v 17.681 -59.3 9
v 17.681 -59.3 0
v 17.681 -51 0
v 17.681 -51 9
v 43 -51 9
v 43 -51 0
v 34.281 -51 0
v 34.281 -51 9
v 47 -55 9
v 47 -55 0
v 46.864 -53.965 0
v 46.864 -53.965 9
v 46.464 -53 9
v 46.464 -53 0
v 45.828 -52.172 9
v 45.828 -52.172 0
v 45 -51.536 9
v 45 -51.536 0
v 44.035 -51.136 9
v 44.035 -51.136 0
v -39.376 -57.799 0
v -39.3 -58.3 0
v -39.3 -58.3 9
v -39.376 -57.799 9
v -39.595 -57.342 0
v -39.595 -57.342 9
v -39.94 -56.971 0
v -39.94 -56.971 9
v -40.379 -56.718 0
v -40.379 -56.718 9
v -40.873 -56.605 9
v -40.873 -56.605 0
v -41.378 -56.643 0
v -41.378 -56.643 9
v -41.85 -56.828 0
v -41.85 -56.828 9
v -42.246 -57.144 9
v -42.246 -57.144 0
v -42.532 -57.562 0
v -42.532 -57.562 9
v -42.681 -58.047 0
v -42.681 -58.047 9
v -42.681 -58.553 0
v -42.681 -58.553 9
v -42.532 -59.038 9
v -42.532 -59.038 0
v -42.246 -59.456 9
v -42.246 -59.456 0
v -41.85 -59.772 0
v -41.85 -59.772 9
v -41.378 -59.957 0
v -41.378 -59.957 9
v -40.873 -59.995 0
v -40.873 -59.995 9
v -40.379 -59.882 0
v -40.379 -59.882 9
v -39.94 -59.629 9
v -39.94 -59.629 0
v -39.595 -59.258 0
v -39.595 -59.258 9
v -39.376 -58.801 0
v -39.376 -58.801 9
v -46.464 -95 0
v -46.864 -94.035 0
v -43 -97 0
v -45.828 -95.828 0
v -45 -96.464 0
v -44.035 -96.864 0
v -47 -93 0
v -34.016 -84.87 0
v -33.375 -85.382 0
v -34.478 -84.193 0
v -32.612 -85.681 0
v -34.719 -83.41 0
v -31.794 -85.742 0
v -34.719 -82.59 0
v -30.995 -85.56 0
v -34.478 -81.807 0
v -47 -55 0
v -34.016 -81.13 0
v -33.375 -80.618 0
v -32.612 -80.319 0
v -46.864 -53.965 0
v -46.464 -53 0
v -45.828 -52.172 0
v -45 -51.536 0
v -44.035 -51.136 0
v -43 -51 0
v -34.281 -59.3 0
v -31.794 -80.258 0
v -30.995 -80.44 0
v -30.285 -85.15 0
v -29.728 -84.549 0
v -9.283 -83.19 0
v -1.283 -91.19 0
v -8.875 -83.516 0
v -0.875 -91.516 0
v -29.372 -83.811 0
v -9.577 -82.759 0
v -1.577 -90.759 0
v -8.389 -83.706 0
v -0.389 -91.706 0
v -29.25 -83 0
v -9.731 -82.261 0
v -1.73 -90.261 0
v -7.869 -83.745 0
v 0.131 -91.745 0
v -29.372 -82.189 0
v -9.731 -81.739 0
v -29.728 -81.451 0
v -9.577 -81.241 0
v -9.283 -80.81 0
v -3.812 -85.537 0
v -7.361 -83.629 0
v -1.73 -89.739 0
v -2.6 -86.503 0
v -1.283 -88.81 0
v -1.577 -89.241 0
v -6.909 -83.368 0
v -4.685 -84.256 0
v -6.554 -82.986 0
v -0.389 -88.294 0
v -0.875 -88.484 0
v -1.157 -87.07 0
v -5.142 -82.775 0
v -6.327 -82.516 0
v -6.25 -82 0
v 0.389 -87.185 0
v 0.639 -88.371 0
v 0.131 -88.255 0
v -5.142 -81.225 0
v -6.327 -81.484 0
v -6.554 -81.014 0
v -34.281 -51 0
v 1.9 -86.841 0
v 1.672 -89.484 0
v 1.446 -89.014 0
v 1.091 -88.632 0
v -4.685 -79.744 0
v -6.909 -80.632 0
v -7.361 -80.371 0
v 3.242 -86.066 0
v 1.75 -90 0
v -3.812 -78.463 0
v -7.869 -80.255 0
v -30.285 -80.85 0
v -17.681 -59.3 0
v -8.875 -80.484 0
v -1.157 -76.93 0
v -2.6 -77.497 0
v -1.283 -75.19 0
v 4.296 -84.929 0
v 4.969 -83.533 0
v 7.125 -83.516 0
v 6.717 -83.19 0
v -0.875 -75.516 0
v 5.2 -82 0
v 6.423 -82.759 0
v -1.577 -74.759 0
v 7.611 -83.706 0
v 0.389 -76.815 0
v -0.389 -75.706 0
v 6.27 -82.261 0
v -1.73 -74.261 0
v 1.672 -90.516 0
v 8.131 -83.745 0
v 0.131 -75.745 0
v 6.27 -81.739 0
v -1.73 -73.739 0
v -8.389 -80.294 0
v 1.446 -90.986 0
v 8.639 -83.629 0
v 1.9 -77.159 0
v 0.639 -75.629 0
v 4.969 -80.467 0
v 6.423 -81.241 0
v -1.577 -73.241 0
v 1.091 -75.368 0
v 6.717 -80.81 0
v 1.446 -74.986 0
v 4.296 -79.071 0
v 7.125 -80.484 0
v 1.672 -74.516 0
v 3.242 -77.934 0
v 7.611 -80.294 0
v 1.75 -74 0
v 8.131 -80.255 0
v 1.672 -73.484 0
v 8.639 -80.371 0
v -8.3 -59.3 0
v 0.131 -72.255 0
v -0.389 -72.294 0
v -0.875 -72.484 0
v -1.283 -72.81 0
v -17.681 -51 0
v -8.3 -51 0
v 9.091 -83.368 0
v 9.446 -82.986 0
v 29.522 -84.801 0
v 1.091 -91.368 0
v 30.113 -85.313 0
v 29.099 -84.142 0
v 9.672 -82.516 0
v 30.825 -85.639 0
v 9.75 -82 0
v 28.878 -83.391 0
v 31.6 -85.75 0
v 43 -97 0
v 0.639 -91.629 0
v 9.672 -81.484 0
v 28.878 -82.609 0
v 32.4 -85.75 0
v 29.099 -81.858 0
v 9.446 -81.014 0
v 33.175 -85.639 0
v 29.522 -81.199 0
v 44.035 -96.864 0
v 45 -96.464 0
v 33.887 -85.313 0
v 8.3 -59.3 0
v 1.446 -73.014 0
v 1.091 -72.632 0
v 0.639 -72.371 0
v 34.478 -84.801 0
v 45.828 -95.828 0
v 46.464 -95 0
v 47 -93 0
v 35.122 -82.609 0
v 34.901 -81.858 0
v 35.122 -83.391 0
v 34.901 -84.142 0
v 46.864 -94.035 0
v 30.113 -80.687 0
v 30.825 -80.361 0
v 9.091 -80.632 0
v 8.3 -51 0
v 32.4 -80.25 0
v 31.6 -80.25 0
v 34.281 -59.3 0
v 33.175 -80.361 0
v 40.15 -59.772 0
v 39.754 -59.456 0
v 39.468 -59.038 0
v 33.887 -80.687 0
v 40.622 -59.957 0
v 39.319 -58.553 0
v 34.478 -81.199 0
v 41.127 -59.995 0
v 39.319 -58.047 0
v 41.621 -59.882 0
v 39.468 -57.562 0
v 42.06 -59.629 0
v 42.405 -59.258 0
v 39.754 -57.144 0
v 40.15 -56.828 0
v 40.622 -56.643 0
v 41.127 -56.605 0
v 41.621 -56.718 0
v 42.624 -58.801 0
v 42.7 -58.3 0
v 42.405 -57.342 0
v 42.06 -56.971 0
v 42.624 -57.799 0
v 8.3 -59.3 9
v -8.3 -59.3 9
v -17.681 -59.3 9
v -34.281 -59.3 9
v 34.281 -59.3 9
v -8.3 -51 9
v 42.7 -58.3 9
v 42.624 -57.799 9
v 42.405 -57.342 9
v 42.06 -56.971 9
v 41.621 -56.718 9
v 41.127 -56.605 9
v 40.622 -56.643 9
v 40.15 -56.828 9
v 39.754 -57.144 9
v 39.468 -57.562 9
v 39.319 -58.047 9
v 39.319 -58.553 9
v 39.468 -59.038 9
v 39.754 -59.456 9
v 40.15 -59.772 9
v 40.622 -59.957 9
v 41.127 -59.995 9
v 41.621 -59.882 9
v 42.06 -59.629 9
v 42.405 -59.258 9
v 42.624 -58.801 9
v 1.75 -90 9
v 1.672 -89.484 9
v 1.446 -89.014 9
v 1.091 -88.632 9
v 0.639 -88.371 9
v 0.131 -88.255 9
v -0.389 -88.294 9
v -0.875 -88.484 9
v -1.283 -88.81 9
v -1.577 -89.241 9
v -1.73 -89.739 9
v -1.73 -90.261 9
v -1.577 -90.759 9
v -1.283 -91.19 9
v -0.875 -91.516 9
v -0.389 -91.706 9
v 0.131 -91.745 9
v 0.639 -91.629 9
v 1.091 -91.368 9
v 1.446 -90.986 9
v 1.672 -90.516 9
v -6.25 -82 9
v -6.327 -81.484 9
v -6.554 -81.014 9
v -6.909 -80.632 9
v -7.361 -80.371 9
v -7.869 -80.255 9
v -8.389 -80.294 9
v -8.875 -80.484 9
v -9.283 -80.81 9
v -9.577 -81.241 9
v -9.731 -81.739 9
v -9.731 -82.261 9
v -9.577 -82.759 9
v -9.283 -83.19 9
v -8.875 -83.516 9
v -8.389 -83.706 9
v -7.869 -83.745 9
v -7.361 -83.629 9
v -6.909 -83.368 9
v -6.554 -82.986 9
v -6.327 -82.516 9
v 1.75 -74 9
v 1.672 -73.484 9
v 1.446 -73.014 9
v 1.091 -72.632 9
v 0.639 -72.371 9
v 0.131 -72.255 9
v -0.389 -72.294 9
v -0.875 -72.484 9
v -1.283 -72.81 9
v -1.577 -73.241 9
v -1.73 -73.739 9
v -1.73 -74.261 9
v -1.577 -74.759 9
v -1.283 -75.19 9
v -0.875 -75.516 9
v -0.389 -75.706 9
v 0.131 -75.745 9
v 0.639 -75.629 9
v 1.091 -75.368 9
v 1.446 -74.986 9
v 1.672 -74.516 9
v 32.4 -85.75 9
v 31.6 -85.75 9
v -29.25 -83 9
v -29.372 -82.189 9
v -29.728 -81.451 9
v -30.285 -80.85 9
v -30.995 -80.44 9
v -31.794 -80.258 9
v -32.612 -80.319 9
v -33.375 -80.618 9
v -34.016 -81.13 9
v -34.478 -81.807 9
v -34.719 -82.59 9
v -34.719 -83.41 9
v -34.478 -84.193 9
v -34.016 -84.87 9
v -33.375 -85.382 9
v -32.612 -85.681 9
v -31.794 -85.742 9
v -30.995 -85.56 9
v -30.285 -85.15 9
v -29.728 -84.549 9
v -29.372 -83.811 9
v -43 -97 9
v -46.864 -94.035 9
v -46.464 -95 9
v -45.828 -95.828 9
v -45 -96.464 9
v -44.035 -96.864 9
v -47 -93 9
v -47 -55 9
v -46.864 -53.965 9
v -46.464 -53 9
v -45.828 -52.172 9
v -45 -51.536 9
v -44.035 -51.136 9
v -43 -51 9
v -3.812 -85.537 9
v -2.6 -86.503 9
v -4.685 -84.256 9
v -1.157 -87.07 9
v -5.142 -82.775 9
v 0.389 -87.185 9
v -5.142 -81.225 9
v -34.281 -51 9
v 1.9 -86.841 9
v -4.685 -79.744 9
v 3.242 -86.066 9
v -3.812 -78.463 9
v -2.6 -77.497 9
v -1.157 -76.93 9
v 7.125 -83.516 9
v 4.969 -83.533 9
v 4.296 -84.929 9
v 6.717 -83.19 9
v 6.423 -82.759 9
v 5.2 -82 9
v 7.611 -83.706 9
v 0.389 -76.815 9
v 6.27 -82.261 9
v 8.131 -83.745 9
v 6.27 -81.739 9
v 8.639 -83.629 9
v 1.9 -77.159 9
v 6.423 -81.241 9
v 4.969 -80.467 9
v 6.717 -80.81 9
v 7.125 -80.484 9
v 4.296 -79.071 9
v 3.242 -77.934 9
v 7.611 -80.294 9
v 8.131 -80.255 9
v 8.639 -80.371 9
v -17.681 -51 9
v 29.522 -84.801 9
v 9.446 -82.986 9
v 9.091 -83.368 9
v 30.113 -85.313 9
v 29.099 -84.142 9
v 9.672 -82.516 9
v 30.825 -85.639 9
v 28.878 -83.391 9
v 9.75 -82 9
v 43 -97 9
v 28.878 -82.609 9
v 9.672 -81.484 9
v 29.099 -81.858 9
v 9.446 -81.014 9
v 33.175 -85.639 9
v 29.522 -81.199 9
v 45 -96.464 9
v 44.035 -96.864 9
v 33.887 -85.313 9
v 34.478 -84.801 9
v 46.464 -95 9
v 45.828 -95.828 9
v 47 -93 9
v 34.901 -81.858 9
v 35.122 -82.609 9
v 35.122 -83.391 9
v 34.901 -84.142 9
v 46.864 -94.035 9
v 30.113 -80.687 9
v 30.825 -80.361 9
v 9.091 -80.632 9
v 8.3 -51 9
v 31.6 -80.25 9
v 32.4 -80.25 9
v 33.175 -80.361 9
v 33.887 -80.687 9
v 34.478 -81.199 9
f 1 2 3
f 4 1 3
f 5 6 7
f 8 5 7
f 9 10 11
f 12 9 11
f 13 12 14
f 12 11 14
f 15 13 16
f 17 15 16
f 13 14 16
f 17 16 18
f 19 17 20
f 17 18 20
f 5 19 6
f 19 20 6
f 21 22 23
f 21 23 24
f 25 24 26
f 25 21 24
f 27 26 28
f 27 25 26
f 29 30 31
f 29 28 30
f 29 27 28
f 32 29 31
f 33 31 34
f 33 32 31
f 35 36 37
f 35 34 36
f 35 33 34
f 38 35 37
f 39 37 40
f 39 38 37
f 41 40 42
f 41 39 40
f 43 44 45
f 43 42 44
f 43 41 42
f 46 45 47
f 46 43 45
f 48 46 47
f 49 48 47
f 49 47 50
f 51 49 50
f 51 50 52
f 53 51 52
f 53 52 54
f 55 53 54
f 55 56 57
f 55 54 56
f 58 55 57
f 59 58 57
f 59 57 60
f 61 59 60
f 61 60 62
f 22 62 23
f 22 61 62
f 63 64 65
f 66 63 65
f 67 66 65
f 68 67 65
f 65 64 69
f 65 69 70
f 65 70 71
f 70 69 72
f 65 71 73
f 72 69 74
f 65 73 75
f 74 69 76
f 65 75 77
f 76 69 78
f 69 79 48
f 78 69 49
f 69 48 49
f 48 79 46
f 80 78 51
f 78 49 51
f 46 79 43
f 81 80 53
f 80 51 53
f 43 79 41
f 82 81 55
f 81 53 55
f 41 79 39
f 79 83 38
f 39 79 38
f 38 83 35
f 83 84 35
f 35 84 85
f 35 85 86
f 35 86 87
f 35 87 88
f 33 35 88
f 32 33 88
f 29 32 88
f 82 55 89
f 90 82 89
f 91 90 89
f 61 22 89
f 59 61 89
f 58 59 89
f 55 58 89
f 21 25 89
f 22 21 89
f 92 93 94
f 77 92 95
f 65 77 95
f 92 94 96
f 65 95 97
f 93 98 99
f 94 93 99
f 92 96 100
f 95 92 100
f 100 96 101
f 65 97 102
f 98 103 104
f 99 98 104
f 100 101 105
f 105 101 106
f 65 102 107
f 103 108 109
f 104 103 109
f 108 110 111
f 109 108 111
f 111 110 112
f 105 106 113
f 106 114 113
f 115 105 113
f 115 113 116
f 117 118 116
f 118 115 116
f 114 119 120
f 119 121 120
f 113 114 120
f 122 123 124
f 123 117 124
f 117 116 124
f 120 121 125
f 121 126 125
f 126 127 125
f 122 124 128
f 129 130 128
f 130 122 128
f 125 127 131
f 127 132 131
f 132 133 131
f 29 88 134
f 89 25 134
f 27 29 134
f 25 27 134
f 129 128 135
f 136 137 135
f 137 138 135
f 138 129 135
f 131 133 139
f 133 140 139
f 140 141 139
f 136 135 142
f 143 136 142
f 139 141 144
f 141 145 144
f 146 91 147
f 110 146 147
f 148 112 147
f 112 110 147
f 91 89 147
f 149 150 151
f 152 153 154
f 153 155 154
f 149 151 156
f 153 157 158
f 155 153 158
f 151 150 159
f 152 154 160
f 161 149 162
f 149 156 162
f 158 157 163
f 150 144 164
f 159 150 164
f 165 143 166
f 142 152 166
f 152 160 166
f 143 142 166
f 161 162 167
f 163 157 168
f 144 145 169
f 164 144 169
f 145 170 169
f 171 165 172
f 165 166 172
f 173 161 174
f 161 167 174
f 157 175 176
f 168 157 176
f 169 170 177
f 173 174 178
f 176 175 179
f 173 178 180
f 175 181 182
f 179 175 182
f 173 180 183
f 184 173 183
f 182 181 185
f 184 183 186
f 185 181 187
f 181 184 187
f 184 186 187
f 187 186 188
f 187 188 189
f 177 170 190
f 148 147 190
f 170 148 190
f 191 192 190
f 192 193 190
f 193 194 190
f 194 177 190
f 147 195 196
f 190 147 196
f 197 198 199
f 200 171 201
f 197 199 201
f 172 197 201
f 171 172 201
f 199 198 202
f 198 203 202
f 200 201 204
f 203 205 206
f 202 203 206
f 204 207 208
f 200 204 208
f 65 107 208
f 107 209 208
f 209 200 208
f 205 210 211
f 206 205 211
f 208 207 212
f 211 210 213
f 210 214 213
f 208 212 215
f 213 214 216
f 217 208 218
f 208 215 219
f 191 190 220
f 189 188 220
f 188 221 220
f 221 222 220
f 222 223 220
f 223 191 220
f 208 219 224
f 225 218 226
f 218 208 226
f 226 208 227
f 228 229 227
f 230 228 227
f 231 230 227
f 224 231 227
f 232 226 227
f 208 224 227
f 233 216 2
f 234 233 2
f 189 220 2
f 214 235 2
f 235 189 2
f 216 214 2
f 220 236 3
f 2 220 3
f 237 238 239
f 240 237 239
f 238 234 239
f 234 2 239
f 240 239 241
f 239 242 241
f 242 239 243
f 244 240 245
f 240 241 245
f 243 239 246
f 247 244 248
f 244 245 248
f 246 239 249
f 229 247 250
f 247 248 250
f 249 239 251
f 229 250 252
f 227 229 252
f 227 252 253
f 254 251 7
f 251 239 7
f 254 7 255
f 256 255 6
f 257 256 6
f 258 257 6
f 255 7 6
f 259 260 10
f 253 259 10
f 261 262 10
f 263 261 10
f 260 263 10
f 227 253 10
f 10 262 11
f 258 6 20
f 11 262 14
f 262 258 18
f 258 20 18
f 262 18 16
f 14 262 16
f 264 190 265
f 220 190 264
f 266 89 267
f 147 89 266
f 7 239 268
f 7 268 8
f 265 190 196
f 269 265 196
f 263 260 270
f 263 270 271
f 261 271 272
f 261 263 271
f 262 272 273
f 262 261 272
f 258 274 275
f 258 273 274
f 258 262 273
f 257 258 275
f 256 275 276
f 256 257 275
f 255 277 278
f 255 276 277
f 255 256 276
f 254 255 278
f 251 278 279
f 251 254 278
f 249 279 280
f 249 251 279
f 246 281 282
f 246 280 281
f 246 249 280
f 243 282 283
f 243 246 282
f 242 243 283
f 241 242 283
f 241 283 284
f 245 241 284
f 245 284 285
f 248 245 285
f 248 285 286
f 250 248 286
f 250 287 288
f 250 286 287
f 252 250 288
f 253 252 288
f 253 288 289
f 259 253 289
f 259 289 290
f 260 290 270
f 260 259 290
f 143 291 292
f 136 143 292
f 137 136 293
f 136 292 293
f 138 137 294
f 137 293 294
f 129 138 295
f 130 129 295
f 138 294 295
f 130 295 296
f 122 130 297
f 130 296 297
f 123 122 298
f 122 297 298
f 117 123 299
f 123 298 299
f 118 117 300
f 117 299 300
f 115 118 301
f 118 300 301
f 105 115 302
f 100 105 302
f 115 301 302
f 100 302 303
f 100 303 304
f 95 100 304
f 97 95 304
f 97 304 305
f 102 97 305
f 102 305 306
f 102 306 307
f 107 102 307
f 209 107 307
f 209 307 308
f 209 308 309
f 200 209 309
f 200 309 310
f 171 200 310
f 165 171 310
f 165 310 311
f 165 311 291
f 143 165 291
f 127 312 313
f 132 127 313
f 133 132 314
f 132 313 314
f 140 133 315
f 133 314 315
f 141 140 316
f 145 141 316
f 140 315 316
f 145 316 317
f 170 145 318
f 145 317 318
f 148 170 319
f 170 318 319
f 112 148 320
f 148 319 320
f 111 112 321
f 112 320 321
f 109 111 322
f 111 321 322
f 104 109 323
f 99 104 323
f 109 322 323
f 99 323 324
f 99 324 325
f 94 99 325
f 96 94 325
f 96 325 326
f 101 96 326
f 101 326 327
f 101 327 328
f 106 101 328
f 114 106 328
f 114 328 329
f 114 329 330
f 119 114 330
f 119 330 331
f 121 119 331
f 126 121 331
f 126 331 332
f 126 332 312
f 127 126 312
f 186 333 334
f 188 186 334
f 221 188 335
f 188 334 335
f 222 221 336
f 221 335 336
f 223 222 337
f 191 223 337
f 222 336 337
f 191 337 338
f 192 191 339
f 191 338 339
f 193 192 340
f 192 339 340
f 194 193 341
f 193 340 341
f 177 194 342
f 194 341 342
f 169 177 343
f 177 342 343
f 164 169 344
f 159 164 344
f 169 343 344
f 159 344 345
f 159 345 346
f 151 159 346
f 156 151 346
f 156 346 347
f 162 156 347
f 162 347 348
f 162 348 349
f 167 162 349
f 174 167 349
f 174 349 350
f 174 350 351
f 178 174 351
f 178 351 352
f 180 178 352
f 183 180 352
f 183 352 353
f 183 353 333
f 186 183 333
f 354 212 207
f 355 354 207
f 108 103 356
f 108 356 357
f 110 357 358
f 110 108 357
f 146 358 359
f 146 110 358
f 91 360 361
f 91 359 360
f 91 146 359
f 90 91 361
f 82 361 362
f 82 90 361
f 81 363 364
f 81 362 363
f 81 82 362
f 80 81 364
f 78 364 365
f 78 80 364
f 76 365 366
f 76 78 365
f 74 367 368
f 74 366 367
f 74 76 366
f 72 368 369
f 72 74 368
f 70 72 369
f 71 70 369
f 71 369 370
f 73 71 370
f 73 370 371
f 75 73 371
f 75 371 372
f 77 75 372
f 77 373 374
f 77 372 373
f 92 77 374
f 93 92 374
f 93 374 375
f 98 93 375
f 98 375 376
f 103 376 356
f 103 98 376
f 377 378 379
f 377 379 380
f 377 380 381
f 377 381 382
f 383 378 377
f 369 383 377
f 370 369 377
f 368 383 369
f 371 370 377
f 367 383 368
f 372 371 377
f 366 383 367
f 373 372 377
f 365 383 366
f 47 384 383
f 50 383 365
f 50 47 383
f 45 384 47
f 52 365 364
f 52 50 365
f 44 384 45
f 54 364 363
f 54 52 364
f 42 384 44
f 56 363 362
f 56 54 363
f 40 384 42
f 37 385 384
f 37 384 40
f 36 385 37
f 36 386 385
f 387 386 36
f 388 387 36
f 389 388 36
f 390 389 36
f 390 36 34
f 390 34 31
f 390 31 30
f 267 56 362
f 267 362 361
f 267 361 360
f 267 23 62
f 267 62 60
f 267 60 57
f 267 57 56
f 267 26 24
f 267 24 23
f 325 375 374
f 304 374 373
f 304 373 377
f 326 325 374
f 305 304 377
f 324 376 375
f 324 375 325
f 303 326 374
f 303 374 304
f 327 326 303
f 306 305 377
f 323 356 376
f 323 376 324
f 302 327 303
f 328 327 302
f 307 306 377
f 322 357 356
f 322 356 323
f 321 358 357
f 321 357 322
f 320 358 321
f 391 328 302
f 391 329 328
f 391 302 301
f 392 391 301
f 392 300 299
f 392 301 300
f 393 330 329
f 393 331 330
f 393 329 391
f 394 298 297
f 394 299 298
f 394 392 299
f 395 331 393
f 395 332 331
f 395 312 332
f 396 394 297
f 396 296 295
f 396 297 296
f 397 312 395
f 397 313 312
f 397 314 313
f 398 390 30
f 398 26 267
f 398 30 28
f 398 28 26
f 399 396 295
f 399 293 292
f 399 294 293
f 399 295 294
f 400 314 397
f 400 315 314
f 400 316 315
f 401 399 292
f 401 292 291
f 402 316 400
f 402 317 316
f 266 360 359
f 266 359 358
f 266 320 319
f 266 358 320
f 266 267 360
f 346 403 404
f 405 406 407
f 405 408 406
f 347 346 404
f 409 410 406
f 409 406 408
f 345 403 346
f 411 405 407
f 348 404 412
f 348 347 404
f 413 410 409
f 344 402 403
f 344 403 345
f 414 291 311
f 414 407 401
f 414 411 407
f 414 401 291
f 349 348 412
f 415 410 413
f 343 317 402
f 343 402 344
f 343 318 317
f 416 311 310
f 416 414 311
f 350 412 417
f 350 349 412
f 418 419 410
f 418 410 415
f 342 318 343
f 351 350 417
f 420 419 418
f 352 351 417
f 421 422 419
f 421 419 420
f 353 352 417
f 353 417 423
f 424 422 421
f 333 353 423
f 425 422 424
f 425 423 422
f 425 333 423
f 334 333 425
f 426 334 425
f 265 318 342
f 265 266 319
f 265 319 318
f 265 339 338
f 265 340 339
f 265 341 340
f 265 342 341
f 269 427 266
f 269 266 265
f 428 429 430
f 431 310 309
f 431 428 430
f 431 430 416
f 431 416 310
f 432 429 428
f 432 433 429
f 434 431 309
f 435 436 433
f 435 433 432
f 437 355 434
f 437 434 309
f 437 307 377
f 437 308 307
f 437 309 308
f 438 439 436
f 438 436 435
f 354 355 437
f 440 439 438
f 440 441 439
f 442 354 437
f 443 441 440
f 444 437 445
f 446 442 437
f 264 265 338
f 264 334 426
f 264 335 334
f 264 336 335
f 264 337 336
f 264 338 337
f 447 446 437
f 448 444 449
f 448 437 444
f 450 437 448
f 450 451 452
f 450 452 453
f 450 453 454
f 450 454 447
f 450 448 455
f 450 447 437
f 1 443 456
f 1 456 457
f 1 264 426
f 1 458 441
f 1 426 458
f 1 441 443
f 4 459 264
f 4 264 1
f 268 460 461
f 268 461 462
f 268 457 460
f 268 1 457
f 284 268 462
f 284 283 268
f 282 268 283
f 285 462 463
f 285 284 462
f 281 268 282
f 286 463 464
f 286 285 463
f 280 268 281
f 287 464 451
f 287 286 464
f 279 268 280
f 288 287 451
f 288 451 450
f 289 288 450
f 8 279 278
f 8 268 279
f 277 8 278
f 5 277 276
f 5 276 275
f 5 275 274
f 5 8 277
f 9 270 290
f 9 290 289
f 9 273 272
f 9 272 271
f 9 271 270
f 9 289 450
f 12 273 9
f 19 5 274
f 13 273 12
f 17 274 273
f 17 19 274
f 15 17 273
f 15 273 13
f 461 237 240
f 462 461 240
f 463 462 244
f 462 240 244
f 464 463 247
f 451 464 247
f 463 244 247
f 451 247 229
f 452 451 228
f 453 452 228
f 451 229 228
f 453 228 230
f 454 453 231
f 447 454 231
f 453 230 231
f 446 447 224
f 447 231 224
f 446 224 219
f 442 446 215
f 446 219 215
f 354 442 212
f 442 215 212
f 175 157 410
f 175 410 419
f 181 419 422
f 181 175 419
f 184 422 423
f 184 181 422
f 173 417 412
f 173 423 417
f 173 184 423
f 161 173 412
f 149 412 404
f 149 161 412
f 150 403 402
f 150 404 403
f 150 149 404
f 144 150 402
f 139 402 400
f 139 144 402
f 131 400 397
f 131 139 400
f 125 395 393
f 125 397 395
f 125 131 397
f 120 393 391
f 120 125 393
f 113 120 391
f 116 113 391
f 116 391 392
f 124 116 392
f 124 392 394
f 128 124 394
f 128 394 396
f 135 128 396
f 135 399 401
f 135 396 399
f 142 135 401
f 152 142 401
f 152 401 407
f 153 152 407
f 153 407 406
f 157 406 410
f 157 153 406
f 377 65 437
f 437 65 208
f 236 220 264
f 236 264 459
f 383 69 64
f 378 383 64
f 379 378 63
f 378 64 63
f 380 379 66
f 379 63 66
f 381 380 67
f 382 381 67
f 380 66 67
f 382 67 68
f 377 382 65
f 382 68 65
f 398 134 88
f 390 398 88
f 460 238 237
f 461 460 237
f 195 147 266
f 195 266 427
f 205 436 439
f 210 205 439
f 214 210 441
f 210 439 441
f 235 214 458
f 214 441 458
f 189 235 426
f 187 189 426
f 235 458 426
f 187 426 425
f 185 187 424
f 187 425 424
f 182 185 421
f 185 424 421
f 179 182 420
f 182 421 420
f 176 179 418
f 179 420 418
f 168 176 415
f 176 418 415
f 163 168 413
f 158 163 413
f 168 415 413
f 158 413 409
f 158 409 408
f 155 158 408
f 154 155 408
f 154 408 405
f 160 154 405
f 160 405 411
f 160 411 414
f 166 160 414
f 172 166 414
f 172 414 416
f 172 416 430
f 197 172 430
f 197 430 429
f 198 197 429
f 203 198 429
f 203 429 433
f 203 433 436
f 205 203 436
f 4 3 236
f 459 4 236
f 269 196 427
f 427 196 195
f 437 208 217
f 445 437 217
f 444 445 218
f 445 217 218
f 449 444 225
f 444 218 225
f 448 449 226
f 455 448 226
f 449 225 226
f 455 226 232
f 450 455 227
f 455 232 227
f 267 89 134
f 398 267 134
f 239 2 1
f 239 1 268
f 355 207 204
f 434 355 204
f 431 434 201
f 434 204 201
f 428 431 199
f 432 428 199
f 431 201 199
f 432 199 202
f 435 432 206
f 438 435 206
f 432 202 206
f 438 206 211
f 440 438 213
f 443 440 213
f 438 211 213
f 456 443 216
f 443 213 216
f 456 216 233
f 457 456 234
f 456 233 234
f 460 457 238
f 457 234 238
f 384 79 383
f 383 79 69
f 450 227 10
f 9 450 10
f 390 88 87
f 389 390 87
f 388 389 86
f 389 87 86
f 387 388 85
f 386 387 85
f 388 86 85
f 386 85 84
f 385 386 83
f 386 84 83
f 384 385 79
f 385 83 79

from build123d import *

# Parameters (mm, degrees)
F_01_COMMON_SLIDER_BLANK_DEPTH                 = 9
F_02_START                                     = -0.5
S02_ROUND_LOCATING_GUIDE_AND_RELIEVED_R        = 2.75
F_02_ROUND_LOCATING_GUIDE_AND_RELIEVED_C_DEPTH = 10
F_03_START                                     = -0.5
S03_THREE_DROP_IN_SPRING_SEATS_W               = 16.6
S03_THREE_DROP_IN_SPRING_SEATS_H               = 9.3
F_03_THREE_DROP_IN_SPRING_SEATS_DEPTH          = 10
F_04_START                                     = -0.5
S04_KEEPER_SCREW_HOLES_R                       = 1.7
F_04_KEEPER_SCREW_HOLES_DEPTH                  = 10
F_07_START                                     = -0.15
S07_CLEARANCE_TUNNEL_FOR_ROTATING_SPIN_R       = 5.2
F_07_CLEARANCE_TUNNEL_FOR_ROTATING_SPIND_DEPTH = 109.311915664
SKETCH1_R                                      = 1.75
SKETCH1_R_2                                    = 1.75028584
CUT_EXTRUDE1_DEPTH                             = 10


with BuildPart() as part:
    # S01 - Common slider blank → 01 - Common slider blank (new body)
    with BuildSketch(Plane.XY):
        with BuildLine():
            Line((-43, -97), (43, -97))
            ThreePointArc((43, -97), (45.828427125, -95.828427125), (47, -93))
            Line((47, -93), (47, -55))
            ThreePointArc((47, -55), (45.828427125, -52.171572875), (43, -51))
            Line((43, -51), (-43, -51))
            ThreePointArc((-43, -51), (-45.828427125, -52.171572875), (-47, -55))
            Line((-47, -55), (-47, -93))
            ThreePointArc((-47, -93), (-45.828427125, -95.828427125), (-43, -97))
        make_face()
    extrude(amount=F_01_COMMON_SLIDER_BLANK_DEPTH)

    # S02 - Round locating guide and relieved companion → 02 - Round locating guide and relieved companion (cut)
    with BuildSketch(Plane.XY.offset(F_02_START)):
        with Locations((-32, -83)):
            Circle(S02_ROUND_LOCATING_GUIDE_AND_RELIEVED_R)
        with BuildLine():
            Line((31.6, -80.25), (32.4, -80.25))
            ThreePointArc((32.4, -80.25), (35.15, -83), (32.4, -85.75))
            Line((32.4, -85.75), (31.6, -85.75))
            ThreePointArc((31.6, -85.75), (28.85, -83), (31.6, -80.25))
        make_face()
    extrude(amount=F_02_ROUND_LOCATING_GUIDE_AND_RELIEVED_C_DEPTH, mode=Mode.SUBTRACT)

    # S03 - Three drop-in spring seats → 03 - Three drop-in spring seats (cut)
    with BuildSketch(Plane.XY.offset(F_03_START)):
        with Locations((-25.980762114, -54.65)):
            Rectangle(S03_THREE_DROP_IN_SPRING_SEATS_W, S03_THREE_DROP_IN_SPRING_SEATS_H)
        with Locations((25.980762114, -54.65)):
            Rectangle(S03_THREE_DROP_IN_SPRING_SEATS_W, S03_THREE_DROP_IN_SPRING_SEATS_H)
        with Locations((0, -54.65)):
            Rectangle(S03_THREE_DROP_IN_SPRING_SEATS_W, S03_THREE_DROP_IN_SPRING_SEATS_H)
    extrude(amount=F_03_THREE_DROP_IN_SPRING_SEATS_DEPTH, mode=Mode.SUBTRACT)

    # S04 - Keeper screw holes → 04 - Keeper screw holes (cut)
    with BuildSketch(Plane.XY.offset(F_04_START)):
        with Locations((-41, -58.3)):
            Circle(S04_KEEPER_SCREW_HOLES_R)
        with Locations((41, -58.3)):
            Circle(S04_KEEPER_SCREW_HOLES_R)
    extrude(amount=F_04_KEEPER_SCREW_HOLES_DEPTH, mode=Mode.SUBTRACT)

    # S07 - Clearance tunnel for rotating spindle retainer → 07 - Clearance tunnel for rotating spindle retainer (cut, through all)
    with BuildSketch(Plane.XY.offset(F_07_START)):
        with Locations((0, -82)):
            Circle(S07_CLEARANCE_TUNNEL_FOR_ROTATING_SPIN_R)
    extrude(amount=F_07_CLEARANCE_TUNNEL_FOR_ROTATING_SPIND_DEPTH, mode=Mode.SUBTRACT)

    # Sketch1 → Cut-Extrude1 (cut)
    with BuildSketch(Plane.XY.offset(9)):
        with Locations((8, -82)):
            Circle(SKETCH1_R)
        with Locations((0, -74)):
            Circle(SKETCH1_R)
        with Locations((0, -90)):
            Circle(SKETCH1_R)
        with Locations((-8, -82)):
            Circle(SKETCH1_R_2)
    extrude(amount=-CUT_EXTRUDE1_DEPTH, mode=Mode.SUBTRACT)


solid = part.part
